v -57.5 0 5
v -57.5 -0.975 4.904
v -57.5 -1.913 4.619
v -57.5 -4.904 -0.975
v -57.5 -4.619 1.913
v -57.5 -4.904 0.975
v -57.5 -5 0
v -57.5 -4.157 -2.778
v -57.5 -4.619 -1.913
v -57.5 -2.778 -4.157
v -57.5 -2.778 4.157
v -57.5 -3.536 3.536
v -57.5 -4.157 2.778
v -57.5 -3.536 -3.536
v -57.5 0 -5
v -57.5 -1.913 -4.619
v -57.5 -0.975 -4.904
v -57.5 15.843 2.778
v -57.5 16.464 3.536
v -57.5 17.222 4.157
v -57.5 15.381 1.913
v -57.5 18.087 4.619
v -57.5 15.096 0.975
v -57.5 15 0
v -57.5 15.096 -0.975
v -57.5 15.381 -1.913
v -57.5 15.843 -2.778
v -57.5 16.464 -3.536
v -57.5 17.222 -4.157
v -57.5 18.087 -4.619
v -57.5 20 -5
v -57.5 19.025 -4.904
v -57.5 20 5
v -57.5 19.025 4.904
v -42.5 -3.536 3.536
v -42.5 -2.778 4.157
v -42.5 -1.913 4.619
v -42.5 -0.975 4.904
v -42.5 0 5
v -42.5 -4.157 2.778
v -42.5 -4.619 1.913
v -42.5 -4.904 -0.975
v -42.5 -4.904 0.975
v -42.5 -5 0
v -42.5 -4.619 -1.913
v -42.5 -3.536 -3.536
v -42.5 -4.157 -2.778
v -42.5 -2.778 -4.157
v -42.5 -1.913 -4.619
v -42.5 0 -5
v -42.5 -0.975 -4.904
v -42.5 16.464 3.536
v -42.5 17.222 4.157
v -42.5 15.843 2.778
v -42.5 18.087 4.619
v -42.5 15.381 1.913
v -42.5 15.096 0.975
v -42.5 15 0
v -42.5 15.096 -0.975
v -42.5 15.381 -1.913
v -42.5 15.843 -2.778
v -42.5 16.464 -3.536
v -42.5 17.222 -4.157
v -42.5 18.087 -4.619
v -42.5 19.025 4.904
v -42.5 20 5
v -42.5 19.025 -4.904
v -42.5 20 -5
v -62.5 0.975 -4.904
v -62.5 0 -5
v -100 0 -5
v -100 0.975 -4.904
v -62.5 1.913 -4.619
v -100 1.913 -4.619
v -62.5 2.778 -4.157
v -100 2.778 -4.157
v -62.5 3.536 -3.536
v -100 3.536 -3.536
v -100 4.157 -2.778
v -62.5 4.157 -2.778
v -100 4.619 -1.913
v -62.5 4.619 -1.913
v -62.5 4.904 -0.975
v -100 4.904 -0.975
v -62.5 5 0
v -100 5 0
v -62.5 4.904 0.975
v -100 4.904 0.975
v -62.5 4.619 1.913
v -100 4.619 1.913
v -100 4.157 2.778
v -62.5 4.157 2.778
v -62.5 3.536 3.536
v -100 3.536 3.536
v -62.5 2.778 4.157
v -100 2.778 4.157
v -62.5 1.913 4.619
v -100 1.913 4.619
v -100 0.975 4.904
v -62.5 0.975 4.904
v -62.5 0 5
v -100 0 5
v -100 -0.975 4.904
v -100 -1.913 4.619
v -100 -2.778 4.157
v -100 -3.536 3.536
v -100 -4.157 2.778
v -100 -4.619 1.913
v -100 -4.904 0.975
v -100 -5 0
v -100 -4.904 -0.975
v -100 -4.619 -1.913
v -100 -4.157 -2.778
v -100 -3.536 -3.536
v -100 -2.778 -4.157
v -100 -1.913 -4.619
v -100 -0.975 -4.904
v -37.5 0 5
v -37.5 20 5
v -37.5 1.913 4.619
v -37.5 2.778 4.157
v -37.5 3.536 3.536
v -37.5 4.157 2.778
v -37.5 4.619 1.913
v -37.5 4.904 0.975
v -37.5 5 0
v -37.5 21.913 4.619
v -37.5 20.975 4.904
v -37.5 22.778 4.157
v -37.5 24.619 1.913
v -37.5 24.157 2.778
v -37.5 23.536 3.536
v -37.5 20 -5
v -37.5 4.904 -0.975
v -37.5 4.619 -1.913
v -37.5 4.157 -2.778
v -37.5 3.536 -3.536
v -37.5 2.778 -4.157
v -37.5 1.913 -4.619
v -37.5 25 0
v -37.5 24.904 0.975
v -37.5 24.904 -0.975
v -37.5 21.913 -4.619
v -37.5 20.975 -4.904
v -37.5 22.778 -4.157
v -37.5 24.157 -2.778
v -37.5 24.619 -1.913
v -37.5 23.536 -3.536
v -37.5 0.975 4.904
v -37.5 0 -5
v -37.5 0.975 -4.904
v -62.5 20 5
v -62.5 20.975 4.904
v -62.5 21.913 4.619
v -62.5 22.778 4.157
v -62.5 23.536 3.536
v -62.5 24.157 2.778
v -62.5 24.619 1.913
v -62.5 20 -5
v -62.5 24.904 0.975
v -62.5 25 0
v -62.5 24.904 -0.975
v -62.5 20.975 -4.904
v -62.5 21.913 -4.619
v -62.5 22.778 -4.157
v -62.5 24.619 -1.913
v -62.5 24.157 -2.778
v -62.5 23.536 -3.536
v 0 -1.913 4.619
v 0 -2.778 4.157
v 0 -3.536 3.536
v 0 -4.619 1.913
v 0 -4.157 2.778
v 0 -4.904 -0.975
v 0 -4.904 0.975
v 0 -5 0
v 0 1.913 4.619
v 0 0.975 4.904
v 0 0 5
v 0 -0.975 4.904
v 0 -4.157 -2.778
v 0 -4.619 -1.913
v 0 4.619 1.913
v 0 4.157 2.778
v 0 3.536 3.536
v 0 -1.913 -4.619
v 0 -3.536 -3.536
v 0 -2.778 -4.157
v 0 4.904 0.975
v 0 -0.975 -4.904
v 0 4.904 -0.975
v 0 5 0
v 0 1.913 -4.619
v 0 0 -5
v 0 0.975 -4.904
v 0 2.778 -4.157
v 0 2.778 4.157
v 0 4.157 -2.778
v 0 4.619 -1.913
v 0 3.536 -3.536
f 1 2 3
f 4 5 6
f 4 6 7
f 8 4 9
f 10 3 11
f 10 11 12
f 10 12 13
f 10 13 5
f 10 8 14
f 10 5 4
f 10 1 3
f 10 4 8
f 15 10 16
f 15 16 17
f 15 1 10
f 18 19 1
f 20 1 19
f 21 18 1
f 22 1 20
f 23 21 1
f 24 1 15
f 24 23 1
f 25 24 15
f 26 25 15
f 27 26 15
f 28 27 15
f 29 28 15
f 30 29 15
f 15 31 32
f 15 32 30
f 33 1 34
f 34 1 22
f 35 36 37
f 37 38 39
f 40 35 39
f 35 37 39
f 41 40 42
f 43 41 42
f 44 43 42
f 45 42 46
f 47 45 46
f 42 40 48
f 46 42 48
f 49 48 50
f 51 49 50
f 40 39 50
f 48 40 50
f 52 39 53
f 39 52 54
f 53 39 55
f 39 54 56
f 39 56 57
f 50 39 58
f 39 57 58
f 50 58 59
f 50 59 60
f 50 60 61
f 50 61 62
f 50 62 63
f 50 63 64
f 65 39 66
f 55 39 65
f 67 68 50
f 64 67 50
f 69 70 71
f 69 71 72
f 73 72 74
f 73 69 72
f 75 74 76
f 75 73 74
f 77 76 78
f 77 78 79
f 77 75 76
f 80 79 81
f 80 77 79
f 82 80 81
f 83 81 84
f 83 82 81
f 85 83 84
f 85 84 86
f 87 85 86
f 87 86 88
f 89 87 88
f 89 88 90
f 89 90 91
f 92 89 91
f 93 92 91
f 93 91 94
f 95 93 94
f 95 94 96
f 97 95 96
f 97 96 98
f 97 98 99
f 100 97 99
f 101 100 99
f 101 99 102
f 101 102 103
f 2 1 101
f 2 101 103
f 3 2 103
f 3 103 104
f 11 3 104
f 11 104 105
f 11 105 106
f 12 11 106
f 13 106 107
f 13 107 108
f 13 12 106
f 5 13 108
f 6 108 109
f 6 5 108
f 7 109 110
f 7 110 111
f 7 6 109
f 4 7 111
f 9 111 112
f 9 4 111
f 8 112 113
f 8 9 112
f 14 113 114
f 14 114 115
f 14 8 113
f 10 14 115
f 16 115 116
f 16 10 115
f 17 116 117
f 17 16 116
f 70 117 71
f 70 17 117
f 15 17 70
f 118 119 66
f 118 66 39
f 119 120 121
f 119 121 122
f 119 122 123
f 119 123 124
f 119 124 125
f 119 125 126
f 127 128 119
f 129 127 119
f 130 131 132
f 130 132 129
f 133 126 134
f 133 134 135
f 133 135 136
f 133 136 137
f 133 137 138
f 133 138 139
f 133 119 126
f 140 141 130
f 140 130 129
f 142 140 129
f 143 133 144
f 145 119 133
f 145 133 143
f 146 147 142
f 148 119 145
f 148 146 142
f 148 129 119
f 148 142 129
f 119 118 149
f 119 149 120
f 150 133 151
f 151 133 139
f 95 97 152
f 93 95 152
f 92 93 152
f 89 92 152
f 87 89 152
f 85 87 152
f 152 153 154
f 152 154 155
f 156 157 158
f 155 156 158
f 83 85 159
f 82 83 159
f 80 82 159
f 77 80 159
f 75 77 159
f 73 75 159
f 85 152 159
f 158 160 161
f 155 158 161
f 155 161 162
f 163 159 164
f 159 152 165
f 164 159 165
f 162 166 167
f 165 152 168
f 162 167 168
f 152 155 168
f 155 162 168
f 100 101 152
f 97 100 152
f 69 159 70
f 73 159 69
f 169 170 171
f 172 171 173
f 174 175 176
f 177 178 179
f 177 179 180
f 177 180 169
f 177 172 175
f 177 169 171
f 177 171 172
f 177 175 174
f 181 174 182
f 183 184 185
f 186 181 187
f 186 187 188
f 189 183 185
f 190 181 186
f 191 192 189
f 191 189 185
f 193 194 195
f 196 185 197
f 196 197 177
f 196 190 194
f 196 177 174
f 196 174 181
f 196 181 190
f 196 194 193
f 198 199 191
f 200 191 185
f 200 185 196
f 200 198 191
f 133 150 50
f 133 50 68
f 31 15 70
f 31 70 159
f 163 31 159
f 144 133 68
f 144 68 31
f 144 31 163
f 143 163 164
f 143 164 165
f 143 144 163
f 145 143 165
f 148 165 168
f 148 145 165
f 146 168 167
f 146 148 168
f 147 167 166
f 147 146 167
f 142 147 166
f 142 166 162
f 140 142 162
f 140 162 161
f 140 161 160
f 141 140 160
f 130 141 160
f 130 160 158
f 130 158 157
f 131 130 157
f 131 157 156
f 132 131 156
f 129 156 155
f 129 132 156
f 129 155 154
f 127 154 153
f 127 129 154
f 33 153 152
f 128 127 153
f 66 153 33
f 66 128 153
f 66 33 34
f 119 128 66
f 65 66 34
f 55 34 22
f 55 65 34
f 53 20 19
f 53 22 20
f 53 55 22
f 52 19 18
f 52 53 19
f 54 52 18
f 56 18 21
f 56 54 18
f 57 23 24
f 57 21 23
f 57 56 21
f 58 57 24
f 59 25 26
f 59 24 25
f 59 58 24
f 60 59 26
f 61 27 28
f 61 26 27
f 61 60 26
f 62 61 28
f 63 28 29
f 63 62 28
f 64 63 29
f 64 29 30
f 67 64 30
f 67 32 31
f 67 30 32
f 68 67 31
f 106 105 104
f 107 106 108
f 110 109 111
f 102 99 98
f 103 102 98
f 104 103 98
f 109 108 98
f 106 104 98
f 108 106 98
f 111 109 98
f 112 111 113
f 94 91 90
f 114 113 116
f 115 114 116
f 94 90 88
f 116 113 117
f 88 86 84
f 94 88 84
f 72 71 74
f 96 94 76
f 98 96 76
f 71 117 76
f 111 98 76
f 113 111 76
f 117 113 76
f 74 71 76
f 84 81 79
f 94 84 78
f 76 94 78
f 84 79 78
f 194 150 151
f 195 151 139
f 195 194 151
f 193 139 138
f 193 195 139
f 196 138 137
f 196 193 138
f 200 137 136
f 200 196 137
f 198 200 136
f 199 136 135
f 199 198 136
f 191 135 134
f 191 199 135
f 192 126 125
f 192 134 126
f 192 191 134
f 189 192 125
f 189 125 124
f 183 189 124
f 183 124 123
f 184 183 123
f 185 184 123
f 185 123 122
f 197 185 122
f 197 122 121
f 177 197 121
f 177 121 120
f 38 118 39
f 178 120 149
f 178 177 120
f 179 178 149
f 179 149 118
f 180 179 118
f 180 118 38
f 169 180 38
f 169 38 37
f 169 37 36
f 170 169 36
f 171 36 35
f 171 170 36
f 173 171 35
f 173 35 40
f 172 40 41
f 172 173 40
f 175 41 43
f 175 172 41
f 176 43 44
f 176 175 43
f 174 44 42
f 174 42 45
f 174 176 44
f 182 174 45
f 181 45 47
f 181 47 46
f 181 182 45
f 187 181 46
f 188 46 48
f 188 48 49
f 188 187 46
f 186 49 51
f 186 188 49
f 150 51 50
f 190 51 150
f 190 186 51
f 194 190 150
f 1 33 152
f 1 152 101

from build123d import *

# Parameters (mm, degrees)
SKETCH1_R           = 5
BOSS_EXTRUDE1_DEPTH = 42.5
BOSS_EXTRUDE2_START = -37.5
SKETCH1_3_R         = 5
BOSS_EXTRUDE2_DEPTH = 5
BOSS_EXTRUDE3_START = -37.5
SKETCH1_4_R         = 5
BOSS_EXTRUDE3_DEPTH = 25
BOSS_EXTRUDE4_START = -57.5
BOSS_EXTRUDE4_DEPTH = 5
BOSS_EXTRUDE5_START = -57.5
SKETCH1_6_R         = 5
BOSS_EXTRUDE5_DEPTH = 42.5


with BuildPart() as part:
    # Sketch1 → Boss-Extrude1 (new body)
    with BuildSketch(Plane(origin=(0, 0, 0), x_dir=(0, 0, -1), z_dir=(1, 0, 0))):
        Circle(SKETCH1_R)
    extrude(amount=-BOSS_EXTRUDE1_DEPTH)

    # Sketch1<3> → Boss-Extrude2 (add)
    with BuildSketch(Plane(origin=(0, 0, 0), x_dir=(0, 0, -1), z_dir=(1, 0, 0)).offset(BOSS_EXTRUDE2_START)):
        with BuildLine():
            ThreePointArc((5, 20), (0, 15), (-5, 20))
            Line((-5, 20), (-5, 0))
            ThreePointArc((-5, 0), (0, 5), (5, 0))
            Line((5, 0), (5, 20))
        make_face()
        with Locations((0, 20)):
            Circle(SKETCH1_3_R)
    extrude(amount=-BOSS_EXTRUDE2_DEPTH)

    # Sketch1<4> → Boss-Extrude3 (add)
    with BuildSketch(Plane(origin=(0, 0, 0), x_dir=(0, 0, -1), z_dir=(1, 0, 0)).offset(BOSS_EXTRUDE3_START)):
        with Locations((0, 20)):
            Circle(SKETCH1_4_R)
    extrude(amount=-BOSS_EXTRUDE3_DEPTH)

    # Sketch1<5> → Boss-Extrude4 (add)
    with BuildSketch(Plane(origin=(0, 0, 0), x_dir=(0, 0, -1), z_dir=(1, 0, 0)).offset(BOSS_EXTRUDE4_START)):
        with BuildLine():
            ThreePointArc((5, 20), (0, 15), (-5, 20))
            Line((-5, 20), (-5, 0))
            ThreePointArc((-5, 0), (0, 5), (5, 0))
            Line((5, 0), (5, 20))
        make_face()
    extrude(amount=-BOSS_EXTRUDE4_DEPTH)

    # Sketch1<6> → Boss-Extrude5 (add)
    with BuildSketch(Plane(origin=(0, 0, 0), x_dir=(0, 0, -1), z_dir=(1, 0, 0)).offset(BOSS_EXTRUDE5_START)):
        Circle(SKETCH1_6_R)
    extrude(amount=-BOSS_EXTRUDE5_DEPTH)


solid = part.part
